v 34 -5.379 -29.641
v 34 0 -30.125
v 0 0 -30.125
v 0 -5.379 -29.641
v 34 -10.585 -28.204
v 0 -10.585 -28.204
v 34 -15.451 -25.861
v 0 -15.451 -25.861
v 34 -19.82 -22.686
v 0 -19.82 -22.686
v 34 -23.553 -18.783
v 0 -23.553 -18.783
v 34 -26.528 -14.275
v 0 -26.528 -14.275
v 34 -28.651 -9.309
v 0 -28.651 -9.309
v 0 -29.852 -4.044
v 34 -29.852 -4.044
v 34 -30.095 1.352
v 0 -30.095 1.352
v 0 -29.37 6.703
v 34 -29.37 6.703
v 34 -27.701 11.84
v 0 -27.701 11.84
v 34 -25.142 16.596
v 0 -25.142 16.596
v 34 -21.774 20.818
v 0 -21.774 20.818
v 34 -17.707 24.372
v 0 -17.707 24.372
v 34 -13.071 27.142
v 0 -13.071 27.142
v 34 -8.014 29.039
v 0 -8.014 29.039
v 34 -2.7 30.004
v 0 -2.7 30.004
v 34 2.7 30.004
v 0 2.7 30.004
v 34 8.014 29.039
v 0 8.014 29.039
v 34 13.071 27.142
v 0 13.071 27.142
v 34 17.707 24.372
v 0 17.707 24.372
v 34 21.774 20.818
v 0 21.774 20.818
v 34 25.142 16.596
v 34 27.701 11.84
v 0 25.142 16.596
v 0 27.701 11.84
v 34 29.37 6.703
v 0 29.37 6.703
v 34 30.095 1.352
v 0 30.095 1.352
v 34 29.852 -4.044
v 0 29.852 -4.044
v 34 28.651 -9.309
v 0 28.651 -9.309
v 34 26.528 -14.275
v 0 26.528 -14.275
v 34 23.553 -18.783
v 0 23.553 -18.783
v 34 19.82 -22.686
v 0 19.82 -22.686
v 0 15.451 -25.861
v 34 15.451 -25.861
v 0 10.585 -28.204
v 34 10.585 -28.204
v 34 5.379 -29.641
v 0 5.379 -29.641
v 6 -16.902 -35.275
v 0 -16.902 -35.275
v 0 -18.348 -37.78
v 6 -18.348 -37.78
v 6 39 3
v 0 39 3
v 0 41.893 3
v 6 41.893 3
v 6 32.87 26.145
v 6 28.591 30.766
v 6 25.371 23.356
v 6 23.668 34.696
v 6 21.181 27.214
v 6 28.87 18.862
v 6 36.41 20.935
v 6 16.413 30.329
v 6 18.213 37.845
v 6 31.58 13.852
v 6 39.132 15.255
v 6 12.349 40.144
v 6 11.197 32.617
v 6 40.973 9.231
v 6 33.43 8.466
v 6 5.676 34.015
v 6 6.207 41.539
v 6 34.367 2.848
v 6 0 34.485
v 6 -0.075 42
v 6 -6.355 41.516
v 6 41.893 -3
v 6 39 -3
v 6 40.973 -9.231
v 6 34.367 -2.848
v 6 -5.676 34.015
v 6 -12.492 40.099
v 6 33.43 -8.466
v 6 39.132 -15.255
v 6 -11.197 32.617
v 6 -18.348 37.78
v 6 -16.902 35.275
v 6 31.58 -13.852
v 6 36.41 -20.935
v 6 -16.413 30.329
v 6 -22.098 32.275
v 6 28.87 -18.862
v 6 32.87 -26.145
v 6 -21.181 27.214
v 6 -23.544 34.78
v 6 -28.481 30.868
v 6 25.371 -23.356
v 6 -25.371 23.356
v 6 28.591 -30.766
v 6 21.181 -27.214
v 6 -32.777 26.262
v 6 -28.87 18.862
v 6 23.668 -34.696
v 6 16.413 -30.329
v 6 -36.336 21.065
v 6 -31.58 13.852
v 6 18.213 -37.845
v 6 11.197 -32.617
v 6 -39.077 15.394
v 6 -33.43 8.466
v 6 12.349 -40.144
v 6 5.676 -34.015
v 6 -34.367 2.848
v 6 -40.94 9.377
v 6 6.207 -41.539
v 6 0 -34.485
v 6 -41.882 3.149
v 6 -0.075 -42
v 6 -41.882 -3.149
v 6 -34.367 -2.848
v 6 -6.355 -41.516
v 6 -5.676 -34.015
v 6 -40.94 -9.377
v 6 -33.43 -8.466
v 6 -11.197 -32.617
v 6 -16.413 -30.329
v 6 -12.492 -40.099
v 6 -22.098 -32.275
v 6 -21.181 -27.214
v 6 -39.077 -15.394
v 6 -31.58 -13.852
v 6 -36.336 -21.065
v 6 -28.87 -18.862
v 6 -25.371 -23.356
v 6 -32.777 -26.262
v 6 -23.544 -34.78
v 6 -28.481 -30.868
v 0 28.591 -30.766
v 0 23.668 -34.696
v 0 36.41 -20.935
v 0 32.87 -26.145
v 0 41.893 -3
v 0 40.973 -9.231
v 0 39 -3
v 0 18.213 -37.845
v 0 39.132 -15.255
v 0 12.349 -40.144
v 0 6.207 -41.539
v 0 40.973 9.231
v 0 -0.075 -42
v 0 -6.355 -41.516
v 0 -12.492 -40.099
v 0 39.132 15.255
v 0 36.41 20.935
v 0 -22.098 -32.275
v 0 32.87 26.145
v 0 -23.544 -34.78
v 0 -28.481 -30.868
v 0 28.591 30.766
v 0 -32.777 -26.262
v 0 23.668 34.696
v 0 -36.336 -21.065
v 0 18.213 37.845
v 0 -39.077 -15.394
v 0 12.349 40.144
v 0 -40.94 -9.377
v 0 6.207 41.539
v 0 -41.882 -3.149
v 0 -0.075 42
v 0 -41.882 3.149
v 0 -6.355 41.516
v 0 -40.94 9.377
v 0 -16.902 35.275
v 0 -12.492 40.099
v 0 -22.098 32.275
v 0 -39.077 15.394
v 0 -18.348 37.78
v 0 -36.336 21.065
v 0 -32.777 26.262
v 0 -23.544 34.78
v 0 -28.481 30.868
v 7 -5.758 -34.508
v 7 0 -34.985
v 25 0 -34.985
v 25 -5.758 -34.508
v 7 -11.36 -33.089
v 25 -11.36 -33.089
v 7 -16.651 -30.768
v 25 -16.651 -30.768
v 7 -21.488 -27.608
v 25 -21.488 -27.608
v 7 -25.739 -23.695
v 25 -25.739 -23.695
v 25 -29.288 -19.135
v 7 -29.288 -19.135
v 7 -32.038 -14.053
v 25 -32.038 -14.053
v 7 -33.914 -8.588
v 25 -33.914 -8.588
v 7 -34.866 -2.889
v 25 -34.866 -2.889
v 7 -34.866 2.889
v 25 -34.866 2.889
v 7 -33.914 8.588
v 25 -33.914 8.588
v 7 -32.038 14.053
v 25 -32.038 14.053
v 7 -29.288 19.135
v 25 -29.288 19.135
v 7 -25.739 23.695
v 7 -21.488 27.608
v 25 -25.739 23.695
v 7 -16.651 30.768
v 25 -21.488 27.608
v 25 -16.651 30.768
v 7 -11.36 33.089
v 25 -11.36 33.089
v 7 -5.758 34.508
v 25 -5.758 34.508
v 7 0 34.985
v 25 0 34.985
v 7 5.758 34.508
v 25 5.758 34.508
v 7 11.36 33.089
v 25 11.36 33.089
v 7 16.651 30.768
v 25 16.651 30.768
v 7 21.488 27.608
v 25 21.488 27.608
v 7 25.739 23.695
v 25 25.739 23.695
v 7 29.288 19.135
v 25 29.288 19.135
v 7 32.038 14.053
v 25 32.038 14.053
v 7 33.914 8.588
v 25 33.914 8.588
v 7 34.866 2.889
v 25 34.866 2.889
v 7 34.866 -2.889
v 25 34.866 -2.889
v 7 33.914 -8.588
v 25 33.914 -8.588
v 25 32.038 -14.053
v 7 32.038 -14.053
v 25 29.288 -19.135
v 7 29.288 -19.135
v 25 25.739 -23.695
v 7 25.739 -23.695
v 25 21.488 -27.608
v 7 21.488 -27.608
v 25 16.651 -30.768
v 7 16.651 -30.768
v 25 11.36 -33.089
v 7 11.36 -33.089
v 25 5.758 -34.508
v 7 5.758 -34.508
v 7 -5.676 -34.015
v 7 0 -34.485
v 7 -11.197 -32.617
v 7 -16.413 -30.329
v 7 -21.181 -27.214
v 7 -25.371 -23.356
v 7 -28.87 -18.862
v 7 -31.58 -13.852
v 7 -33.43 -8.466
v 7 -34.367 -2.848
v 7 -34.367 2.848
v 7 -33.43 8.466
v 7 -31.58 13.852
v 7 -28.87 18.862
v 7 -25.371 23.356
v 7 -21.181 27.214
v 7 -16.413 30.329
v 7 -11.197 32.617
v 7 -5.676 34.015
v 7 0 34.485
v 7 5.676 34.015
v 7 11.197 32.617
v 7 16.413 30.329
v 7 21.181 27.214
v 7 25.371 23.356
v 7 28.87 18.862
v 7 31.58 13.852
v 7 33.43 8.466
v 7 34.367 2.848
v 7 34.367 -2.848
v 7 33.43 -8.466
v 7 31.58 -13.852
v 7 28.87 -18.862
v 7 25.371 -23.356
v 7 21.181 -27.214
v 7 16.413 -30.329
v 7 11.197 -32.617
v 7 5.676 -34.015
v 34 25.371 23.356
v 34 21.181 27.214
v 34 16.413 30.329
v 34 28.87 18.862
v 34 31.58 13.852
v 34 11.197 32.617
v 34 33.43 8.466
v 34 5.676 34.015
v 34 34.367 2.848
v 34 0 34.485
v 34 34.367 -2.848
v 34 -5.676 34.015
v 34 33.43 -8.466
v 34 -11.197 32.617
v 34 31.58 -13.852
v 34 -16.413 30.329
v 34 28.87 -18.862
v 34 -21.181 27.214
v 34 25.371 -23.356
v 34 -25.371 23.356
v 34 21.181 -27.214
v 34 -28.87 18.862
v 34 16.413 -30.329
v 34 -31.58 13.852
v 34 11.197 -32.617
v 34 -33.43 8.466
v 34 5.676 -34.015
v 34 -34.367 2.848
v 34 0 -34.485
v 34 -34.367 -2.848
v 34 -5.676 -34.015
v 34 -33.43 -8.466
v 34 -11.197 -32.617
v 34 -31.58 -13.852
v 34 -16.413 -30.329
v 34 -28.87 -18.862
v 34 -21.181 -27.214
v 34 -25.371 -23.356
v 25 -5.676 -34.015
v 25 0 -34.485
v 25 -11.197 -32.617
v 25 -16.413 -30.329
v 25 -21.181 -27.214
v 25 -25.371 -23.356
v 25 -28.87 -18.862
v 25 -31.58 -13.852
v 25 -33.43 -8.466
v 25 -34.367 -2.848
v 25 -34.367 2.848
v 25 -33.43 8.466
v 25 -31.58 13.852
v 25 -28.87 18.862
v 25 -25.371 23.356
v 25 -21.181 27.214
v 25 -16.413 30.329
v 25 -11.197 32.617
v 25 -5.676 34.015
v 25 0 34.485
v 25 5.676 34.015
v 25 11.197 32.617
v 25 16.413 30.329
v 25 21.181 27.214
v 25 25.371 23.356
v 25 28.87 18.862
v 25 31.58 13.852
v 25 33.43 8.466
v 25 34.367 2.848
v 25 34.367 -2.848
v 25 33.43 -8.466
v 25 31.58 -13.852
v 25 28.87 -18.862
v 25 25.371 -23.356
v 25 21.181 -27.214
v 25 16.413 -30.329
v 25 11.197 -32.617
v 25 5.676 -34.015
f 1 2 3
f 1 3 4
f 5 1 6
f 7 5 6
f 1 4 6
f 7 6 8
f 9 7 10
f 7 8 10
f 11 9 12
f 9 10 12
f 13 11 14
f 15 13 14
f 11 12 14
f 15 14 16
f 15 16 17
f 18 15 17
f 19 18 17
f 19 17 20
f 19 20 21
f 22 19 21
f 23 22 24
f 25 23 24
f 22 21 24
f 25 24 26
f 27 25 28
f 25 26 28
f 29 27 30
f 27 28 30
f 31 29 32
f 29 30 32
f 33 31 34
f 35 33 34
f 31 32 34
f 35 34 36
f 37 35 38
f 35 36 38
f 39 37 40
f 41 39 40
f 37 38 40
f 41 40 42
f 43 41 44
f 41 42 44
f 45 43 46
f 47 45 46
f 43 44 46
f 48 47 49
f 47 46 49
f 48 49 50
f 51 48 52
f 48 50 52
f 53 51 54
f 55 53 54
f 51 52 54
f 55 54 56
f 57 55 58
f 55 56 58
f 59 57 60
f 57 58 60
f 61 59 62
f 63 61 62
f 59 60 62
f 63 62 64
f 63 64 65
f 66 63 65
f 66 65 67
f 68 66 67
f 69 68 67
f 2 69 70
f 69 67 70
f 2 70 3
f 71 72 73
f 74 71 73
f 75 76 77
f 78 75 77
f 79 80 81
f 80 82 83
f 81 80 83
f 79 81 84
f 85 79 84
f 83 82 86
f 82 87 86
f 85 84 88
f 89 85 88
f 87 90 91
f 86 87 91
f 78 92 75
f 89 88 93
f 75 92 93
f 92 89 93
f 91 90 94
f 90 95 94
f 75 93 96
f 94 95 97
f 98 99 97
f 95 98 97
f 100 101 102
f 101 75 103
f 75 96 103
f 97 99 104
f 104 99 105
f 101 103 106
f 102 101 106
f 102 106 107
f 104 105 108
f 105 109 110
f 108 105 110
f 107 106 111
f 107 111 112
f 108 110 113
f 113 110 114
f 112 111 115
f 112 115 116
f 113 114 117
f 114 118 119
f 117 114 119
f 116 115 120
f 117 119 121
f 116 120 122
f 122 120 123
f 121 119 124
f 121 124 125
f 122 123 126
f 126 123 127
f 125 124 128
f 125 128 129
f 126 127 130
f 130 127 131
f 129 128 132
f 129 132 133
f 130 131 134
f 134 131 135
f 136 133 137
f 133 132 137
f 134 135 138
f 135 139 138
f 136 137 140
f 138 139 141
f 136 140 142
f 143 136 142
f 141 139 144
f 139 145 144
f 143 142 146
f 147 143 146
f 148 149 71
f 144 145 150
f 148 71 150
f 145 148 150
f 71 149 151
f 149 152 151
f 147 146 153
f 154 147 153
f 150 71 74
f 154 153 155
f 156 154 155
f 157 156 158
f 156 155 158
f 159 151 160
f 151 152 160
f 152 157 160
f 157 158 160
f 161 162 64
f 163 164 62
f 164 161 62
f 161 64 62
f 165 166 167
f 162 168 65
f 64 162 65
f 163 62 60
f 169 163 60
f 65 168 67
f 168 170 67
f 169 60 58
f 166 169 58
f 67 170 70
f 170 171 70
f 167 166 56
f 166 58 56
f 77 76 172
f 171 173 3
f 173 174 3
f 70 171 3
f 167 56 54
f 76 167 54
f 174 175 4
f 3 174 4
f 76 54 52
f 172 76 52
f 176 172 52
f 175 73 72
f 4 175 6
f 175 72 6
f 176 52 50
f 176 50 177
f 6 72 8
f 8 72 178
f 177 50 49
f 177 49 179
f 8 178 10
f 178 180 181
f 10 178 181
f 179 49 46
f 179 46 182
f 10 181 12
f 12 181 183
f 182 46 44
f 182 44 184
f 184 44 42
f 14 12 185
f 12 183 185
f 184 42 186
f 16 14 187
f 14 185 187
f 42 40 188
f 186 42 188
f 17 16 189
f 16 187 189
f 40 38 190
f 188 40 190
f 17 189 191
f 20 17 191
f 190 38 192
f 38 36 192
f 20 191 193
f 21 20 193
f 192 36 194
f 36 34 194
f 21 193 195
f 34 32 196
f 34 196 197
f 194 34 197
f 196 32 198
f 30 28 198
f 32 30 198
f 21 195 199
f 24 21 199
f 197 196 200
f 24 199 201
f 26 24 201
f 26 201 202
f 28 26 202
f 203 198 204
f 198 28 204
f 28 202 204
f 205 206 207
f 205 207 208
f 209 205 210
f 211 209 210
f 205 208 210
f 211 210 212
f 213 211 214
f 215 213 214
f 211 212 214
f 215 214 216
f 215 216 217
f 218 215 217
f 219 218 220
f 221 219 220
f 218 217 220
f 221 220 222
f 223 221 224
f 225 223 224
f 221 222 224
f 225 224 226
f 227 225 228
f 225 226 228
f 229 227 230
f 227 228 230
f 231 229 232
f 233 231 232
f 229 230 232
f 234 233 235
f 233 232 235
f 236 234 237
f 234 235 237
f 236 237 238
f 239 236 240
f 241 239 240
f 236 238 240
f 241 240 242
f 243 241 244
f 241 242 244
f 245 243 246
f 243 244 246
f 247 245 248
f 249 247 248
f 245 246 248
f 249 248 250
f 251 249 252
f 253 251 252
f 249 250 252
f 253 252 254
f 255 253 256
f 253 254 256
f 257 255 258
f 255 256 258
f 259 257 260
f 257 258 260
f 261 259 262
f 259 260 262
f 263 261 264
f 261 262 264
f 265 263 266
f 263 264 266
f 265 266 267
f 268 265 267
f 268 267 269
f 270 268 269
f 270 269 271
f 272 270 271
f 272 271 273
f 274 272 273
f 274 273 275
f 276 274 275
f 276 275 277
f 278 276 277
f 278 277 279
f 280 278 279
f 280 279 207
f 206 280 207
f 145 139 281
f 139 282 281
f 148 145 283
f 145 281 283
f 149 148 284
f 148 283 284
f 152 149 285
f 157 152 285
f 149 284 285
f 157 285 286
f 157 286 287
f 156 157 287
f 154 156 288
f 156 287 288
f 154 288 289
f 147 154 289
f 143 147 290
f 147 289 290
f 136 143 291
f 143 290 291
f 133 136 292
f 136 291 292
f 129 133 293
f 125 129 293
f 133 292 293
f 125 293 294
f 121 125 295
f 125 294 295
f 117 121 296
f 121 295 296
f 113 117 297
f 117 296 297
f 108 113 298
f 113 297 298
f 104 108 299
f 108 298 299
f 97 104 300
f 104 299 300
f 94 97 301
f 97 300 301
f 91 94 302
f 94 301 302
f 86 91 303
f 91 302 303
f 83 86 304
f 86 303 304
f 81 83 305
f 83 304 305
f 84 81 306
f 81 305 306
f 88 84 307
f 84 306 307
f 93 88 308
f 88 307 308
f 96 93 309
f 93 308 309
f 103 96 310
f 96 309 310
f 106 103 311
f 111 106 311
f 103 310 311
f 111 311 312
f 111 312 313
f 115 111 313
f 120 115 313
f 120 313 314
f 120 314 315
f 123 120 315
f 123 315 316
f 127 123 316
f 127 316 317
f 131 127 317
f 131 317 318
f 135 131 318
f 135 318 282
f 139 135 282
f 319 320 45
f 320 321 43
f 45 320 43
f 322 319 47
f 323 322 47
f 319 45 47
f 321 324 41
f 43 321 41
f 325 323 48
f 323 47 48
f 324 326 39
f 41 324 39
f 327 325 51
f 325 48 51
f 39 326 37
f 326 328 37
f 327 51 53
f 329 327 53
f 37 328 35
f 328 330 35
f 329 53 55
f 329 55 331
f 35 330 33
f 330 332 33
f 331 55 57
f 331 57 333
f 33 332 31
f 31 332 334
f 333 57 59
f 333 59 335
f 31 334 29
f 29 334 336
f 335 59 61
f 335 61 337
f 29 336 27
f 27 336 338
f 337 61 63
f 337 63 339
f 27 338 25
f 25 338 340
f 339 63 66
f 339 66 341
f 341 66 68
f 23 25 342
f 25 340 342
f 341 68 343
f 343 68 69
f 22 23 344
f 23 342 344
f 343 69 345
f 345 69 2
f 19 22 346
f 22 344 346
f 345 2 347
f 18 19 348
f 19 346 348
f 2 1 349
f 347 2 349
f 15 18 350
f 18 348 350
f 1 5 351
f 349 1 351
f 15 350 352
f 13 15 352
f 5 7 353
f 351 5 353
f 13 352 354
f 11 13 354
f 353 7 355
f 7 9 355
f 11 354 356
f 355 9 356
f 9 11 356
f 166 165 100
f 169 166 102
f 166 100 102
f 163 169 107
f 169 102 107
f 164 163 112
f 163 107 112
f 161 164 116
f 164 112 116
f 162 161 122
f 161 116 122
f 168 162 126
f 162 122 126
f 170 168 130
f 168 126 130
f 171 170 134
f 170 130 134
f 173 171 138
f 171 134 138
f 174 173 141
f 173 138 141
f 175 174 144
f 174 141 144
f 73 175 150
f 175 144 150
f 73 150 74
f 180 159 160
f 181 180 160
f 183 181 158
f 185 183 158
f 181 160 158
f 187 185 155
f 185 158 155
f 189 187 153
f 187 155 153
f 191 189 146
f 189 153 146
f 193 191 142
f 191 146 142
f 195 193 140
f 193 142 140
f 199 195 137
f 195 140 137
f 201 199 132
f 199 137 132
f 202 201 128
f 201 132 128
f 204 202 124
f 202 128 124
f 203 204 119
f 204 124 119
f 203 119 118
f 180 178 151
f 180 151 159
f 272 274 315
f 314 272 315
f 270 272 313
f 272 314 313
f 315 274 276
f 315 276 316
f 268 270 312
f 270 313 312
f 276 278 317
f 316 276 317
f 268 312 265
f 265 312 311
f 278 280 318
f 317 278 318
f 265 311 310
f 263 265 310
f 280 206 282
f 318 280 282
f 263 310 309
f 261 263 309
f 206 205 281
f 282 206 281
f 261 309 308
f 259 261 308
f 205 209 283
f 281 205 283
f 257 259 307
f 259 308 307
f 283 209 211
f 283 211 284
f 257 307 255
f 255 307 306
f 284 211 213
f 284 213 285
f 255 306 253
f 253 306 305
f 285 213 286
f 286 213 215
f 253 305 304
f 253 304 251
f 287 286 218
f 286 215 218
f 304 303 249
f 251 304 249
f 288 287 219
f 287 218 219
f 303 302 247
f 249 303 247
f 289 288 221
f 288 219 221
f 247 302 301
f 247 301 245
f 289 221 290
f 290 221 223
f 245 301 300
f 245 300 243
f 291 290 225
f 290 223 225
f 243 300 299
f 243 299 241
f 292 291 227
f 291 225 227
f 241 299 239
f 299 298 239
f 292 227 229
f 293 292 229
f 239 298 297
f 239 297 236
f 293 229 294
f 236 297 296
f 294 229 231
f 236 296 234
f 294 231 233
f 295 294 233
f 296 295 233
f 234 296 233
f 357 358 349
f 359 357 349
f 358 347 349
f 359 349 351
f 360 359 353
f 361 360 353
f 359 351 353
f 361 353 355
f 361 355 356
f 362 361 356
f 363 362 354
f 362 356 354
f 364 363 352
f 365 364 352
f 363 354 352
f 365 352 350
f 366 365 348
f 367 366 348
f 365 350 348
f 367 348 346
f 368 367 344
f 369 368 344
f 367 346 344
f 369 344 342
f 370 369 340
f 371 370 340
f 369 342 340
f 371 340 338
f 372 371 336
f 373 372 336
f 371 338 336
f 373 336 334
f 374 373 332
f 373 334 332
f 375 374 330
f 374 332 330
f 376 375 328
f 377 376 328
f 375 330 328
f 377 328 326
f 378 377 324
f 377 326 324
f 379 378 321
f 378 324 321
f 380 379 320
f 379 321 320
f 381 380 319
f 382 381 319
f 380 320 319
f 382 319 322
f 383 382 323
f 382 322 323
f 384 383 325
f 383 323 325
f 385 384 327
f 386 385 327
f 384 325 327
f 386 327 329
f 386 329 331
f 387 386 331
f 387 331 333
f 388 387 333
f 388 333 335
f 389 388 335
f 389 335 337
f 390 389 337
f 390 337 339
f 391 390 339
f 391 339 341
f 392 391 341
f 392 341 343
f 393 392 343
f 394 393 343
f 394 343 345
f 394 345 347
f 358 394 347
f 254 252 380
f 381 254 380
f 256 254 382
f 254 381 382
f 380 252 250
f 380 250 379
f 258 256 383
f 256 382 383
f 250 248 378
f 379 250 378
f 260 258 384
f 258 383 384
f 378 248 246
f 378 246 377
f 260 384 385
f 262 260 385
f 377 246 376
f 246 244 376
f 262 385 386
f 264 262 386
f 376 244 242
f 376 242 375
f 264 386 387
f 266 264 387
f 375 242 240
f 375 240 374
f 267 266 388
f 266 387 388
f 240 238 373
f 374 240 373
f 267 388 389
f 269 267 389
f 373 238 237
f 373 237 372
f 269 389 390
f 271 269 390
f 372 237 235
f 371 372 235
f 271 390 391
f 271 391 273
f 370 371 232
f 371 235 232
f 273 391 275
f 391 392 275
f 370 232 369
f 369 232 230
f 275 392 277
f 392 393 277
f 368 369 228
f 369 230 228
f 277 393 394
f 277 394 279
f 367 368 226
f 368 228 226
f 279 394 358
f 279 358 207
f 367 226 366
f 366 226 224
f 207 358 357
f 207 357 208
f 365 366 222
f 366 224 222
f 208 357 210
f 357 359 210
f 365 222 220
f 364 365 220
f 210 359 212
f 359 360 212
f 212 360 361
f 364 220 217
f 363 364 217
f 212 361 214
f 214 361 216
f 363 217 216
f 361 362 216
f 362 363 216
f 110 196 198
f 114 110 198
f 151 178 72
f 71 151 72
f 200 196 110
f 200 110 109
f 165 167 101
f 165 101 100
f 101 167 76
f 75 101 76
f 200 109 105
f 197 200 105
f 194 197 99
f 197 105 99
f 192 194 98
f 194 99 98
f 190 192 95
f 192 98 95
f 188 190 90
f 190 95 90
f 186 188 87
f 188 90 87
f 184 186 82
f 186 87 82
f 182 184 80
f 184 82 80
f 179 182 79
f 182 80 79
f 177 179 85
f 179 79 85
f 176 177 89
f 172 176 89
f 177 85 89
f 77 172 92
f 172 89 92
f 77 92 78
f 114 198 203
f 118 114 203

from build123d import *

# Parameters (mm, degrees)
SKETCH2_W          = 6
SKETCH2_H          = 5.216797091
CUT_EXTRUDE1_DEPTH = 69.439754529
CIRPATTERN1_COUNT  = 3


with BuildPart() as part:
    # Sketch1 → Revolve1 (revolve)
    with BuildSketch(Plane.XY, mode=Mode.PRIVATE) as revolve1_sk:
        Polygon((0, 30.125), (0, 42), (6, 42), (6, 34.485), (7, 34.485), (7, 34.985), (25, 34.985), (25, 34.485), (34, 34.485), (34, 30.125), align=None)
    revolve(revolve1_sk.sketch.rotate(Axis((0, 0, 0), (-1, 0, 0)), 90), axis=Axis((0, 0, 0), (-1, 0, 0)))

    # Sketch2 → Cut-Extrude1 (cut, through all)
    with BuildSketch(Plane.ZY):
        with Locations((0, 41.608398546)):
            Rectangle(SKETCH2_W, SKETCH2_H)
    cut_extrude1 = extrude(amount=-CUT_EXTRUDE1_DEPTH, mode=Mode.SUBTRACT)

    # CirPattern1: Cut-Extrude1 ×3 about axis
    cirpattern1_axis = Axis((0, 0, 0), (1, 0, 0))
    for i in range(1, CIRPATTERN1_COUNT):
        add(cut_extrude1.rotate(cirpattern1_axis, i * 360 / CIRPATTERN1_COUNT), mode=Mode.SUBTRACT)


solid = part.part
